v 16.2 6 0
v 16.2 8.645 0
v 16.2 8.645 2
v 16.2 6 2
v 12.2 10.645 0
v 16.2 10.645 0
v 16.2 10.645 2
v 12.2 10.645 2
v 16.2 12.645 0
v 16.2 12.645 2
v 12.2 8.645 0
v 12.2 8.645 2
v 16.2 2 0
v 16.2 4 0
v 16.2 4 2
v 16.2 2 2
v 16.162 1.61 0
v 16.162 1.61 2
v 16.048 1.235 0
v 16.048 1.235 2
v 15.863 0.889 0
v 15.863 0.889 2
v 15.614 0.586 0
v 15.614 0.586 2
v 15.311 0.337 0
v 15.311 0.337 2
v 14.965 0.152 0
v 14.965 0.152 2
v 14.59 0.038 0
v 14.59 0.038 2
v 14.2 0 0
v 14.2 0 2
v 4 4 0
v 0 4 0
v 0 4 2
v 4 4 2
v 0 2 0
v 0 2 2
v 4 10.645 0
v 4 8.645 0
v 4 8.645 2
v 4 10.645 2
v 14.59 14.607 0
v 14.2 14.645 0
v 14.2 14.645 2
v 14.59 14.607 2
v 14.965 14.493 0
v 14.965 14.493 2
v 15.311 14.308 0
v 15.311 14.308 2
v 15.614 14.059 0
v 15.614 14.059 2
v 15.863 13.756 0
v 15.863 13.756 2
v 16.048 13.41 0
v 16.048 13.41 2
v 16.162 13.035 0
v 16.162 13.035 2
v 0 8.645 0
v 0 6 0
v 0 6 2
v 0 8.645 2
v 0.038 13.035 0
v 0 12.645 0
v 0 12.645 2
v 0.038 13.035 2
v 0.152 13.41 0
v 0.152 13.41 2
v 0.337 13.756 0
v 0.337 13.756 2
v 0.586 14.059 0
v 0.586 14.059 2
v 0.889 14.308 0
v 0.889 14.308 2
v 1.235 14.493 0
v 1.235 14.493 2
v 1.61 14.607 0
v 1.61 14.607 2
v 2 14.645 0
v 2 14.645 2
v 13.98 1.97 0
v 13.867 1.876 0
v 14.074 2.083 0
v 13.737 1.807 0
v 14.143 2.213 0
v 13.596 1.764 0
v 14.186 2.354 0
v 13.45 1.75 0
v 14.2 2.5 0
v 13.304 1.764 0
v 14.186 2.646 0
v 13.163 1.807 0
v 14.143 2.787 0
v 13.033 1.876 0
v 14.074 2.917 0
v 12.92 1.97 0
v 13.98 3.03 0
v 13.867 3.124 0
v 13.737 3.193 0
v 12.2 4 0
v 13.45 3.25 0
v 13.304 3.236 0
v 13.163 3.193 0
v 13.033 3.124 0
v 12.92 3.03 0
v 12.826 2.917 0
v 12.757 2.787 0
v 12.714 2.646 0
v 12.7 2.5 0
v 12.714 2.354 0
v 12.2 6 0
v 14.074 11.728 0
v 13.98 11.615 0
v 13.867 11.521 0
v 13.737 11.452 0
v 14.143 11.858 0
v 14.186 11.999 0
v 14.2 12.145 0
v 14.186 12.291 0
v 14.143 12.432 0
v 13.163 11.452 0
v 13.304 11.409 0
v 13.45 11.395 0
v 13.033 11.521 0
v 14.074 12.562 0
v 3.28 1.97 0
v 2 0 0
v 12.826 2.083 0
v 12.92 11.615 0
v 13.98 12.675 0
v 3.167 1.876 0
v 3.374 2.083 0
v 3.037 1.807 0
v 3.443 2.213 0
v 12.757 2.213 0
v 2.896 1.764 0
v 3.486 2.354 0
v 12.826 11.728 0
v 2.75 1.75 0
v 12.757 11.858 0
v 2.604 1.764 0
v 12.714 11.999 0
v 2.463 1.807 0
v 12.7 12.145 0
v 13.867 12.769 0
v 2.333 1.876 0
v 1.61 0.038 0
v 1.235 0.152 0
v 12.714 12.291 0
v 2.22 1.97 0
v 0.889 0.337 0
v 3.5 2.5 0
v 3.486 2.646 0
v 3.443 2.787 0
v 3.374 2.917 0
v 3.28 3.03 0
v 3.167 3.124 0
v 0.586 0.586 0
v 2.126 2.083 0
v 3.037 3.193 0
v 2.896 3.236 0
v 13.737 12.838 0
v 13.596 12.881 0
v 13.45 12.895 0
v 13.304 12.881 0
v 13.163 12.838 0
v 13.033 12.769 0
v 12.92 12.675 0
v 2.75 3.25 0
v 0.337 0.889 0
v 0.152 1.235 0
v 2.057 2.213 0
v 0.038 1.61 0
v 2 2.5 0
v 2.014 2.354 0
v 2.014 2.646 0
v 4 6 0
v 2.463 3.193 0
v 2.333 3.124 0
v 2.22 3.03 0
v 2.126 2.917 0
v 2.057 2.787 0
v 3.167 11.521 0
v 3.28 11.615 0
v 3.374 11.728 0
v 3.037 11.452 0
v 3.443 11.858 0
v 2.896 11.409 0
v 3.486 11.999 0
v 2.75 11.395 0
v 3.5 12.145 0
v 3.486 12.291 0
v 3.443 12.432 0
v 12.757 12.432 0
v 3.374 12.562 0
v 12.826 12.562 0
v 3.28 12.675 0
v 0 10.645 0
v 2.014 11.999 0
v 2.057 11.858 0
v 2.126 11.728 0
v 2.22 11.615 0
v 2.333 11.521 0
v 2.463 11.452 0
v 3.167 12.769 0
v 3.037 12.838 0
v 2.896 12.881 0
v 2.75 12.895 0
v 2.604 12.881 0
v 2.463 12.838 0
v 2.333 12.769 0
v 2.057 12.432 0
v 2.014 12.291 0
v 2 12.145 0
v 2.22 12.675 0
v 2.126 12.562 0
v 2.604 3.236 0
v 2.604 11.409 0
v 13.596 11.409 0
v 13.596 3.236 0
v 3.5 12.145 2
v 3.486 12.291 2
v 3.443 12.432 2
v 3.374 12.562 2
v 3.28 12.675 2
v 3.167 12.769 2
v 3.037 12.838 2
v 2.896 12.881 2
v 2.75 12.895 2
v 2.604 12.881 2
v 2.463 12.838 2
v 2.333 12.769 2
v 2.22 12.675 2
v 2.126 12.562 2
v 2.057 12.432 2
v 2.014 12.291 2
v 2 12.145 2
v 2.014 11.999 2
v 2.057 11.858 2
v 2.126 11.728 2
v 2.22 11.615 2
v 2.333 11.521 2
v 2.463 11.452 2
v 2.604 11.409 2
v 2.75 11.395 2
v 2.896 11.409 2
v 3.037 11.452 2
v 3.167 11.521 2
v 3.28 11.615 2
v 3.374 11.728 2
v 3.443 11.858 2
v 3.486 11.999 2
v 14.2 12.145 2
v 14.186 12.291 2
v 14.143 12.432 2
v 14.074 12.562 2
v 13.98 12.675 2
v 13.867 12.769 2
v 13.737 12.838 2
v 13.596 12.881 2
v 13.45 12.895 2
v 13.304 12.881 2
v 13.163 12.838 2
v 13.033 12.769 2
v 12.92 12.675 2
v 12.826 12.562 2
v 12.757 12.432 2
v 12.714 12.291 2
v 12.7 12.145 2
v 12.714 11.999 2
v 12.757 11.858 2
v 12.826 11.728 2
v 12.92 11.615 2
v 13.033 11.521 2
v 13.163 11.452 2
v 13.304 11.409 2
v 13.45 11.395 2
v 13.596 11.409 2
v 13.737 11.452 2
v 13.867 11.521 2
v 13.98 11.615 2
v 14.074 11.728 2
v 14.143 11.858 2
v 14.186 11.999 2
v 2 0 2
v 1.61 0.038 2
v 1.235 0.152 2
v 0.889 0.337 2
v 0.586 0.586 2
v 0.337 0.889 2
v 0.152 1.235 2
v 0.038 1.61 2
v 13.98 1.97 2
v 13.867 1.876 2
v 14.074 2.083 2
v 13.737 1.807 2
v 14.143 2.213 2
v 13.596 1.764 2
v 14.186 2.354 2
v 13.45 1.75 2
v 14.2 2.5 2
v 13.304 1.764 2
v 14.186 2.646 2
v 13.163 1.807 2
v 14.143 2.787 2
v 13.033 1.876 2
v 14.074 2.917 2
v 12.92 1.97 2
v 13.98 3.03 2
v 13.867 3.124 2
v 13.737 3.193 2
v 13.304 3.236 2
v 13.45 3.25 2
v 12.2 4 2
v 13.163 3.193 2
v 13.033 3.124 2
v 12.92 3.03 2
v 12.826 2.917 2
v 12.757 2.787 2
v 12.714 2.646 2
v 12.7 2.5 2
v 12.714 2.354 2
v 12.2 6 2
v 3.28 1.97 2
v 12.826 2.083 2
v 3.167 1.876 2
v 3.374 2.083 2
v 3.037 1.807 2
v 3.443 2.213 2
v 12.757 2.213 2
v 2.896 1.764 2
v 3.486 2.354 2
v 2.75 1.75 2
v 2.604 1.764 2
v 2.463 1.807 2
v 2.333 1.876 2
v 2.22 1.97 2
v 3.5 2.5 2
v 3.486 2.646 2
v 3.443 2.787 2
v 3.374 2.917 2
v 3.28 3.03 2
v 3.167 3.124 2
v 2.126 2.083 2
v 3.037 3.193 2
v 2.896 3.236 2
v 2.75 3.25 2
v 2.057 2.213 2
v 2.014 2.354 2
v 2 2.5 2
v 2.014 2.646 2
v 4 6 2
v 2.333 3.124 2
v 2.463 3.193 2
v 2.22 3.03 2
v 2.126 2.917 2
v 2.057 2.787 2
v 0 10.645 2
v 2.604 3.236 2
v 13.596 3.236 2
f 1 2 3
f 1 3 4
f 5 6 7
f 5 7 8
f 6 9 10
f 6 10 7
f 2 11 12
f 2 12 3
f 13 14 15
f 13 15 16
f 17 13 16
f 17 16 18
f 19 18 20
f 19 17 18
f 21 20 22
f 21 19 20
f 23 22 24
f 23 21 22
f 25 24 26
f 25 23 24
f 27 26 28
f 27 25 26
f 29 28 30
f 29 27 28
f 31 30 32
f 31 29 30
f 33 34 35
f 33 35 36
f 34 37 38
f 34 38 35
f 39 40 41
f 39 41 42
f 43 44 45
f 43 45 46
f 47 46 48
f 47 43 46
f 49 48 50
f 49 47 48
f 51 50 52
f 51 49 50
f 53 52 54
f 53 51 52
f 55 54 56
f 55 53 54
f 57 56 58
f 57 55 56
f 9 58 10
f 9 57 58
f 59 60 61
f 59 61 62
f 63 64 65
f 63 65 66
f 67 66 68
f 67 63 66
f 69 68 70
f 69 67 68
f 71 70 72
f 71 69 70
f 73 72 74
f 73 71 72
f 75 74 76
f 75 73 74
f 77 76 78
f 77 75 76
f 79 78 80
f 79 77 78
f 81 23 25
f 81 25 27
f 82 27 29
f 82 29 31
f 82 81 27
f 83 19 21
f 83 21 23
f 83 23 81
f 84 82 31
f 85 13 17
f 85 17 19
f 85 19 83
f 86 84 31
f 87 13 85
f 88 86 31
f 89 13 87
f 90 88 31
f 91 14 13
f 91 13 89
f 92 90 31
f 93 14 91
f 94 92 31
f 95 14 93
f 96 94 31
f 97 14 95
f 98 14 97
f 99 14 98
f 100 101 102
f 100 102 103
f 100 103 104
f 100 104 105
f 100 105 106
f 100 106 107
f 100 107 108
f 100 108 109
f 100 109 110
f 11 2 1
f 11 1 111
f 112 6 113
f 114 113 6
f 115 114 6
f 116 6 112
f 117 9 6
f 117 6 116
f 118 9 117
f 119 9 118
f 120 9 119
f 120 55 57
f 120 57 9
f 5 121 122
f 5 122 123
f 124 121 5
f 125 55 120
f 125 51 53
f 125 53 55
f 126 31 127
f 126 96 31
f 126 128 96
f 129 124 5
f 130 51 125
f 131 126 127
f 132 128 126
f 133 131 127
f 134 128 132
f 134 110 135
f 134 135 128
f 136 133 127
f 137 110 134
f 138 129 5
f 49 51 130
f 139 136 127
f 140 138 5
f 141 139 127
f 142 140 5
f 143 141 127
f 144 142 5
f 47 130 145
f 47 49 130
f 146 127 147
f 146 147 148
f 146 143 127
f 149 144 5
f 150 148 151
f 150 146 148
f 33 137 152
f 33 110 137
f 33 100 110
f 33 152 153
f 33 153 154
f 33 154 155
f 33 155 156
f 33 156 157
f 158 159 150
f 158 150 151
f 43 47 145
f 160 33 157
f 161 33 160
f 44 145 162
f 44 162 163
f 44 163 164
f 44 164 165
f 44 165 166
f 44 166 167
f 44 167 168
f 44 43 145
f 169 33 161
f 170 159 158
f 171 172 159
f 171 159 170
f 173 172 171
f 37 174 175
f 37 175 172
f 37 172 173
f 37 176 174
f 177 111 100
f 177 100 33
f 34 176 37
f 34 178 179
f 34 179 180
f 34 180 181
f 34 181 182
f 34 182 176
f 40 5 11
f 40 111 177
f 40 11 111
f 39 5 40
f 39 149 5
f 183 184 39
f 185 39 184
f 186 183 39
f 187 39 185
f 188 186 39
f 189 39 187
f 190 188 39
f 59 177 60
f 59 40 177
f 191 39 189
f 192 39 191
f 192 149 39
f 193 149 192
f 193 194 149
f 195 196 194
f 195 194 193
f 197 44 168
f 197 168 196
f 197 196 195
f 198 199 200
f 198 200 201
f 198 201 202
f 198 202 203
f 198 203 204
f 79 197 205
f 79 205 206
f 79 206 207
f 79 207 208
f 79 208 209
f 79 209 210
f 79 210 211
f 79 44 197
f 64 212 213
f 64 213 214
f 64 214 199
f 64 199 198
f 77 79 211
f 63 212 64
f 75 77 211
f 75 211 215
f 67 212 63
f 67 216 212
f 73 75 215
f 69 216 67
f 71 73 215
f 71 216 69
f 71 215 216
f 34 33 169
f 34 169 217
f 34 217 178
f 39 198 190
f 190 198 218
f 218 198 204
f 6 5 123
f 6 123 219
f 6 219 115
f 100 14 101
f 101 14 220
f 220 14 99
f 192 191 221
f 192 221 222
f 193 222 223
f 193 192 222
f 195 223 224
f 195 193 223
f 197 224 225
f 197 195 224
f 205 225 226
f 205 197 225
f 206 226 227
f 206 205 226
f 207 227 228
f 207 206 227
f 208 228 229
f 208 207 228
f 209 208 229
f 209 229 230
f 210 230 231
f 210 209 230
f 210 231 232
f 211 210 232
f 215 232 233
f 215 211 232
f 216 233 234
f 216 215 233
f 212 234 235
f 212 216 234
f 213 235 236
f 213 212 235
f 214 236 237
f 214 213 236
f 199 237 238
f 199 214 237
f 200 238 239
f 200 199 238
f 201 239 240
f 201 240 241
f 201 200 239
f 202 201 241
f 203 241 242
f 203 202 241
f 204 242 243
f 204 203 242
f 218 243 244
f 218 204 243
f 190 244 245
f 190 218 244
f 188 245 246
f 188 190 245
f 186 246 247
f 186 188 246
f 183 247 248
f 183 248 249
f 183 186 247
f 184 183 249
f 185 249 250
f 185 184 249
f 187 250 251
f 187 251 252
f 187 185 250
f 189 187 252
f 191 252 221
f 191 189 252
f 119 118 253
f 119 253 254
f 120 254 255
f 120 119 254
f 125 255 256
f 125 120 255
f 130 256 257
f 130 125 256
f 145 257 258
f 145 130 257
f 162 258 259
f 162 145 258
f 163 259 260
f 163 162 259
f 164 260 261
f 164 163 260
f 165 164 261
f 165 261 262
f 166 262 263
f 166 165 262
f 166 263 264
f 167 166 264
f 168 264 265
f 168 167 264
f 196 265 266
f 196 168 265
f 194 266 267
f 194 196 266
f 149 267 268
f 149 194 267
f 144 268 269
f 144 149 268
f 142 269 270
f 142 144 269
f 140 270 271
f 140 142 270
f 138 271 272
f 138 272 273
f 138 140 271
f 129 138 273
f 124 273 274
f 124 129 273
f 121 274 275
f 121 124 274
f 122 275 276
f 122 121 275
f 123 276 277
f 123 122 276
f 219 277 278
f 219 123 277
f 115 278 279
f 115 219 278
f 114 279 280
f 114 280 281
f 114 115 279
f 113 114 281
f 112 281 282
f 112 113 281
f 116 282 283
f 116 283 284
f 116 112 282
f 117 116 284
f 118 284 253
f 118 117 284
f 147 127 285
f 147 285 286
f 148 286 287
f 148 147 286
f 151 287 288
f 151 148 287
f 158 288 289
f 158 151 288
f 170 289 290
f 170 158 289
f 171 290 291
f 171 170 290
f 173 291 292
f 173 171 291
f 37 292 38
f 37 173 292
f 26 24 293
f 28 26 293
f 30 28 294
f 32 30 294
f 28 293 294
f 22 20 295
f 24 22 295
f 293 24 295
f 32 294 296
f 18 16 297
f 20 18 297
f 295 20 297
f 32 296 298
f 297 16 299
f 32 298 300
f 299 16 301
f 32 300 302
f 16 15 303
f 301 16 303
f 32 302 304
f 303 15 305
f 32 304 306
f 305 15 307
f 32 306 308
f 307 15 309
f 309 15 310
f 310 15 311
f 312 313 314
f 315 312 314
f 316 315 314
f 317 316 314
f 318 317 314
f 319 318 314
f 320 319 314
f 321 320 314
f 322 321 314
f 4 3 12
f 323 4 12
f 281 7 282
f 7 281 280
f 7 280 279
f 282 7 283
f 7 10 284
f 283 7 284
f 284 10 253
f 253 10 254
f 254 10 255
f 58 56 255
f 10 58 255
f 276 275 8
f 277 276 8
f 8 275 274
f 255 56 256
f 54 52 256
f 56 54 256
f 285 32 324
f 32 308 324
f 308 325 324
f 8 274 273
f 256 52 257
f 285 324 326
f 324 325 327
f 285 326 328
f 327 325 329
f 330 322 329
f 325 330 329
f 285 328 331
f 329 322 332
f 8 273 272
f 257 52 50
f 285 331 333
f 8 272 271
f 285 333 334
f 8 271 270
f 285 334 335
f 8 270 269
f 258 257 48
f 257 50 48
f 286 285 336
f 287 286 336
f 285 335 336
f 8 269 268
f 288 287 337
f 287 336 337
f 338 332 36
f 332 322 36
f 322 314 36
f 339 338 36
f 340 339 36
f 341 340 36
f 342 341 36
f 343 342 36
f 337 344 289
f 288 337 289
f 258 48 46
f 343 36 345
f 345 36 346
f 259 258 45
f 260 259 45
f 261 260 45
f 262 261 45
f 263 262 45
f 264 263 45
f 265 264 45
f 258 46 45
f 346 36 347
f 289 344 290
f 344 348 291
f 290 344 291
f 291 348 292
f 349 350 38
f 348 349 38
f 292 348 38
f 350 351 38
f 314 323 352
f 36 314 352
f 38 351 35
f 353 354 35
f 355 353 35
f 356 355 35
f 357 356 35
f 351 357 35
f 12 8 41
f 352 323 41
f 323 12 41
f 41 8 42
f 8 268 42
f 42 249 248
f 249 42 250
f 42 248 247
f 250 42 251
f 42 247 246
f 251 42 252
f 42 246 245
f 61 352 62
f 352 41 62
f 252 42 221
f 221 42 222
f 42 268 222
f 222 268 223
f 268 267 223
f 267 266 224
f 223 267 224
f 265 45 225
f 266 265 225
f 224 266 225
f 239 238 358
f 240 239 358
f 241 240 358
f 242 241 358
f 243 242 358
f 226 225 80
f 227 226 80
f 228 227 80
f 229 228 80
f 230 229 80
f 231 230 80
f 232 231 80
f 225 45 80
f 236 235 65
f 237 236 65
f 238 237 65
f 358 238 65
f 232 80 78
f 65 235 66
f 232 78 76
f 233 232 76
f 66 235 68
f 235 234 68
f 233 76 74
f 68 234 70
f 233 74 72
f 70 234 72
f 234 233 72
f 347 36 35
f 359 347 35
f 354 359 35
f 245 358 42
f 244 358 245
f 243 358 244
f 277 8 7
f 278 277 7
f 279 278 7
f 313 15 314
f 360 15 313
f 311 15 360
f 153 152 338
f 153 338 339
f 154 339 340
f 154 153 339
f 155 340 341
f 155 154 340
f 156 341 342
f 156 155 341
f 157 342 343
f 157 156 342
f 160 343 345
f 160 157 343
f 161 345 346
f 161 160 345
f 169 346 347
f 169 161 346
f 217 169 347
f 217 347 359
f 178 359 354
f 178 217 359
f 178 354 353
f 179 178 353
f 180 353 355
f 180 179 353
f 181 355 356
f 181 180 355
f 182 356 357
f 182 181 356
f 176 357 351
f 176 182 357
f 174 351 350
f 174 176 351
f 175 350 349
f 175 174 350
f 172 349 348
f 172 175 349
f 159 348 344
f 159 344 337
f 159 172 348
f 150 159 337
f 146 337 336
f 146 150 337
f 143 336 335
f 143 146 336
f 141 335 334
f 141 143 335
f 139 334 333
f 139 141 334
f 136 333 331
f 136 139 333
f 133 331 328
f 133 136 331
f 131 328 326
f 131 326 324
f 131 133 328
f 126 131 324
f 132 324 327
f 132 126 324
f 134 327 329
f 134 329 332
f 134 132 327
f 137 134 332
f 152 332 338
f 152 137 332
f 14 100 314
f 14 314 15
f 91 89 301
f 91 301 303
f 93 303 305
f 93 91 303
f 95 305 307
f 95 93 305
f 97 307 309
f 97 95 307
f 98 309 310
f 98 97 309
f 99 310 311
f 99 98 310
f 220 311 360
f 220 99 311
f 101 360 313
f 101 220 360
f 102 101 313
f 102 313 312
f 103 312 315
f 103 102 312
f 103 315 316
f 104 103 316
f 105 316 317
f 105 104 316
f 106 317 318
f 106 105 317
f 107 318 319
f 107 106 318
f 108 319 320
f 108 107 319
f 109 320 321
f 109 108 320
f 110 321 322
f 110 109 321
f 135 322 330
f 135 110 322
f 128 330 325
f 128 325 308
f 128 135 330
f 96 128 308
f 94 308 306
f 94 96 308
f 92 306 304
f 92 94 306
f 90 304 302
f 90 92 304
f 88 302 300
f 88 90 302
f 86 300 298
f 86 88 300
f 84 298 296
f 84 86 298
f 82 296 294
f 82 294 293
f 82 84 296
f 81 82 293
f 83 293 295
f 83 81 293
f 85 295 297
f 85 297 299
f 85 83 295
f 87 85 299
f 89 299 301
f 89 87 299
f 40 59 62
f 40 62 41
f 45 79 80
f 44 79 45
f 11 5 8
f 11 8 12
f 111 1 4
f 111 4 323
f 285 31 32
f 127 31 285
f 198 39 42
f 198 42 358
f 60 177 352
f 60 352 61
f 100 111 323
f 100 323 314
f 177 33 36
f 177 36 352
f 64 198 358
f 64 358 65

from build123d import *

# Parameters (mm, degrees)
SKETCH1_R           = 0.75
BOSS_EXTRUDE1_DEPTH = 2


with BuildPart() as part:
    # Sketch1 → Boss-Extrude1 (new body)
    with BuildSketch(Plane.XY):
        with BuildLine():
            Line((16.2, 4), (16.2, 2))
            ThreePointArc((16.2, 2), (15.614213562, 0.585786438), (14.2, 0))
            Line((14.2, 0), (2, 0))
            ThreePointArc((2, 0), (0.585786438, 0.585786438), (0, 2))
            Line((0, 2), (0, 4))
            Line((0, 4), (4, 4))
            Line((4, 4), (4, 6))
            Line((4, 6), (0, 6))
            Line((0, 6), (0, 8.645))
            Line((0, 8.645), (4, 8.645))
            Line((4, 8.645), (4, 10.645))
            Line((4, 10.645), (0, 10.645))
            Line((0, 10.645), (0, 12.645))
            ThreePointArc((0, 12.645), (0.585786438, 14.059213562), (2, 14.645))
            Line((2, 14.645), (14.2, 14.645))
            ThreePointArc((14.2, 14.645), (15.614213562, 14.059213562), (16.2, 12.645))
            Line((16.2, 12.645), (16.2, 10.645))
            Line((16.2, 10.645), (12.2, 10.645))
            Line((12.2, 10.645), (12.2, 8.645))
            Line((12.2, 8.645), (16.2, 8.645))
            Line((16.2, 8.645), (16.2, 6))
            Line((16.2, 6), (12.2, 6))
            Line((12.2, 6), (12.2, 4))
            Line((12.2, 4), (16.2, 4))
        make_face()
        with Locations((13.45, 2.5)):
            Circle(SKETCH1_R, mode=Mode.SUBTRACT)
        with Locations((2.75, 12.145)):
            Circle(SKETCH1_R, mode=Mode.SUBTRACT)
        with Locations((13.45, 12.145)):
            Circle(SKETCH1_R, mode=Mode.SUBTRACT)
        with Locations((2.75, 2.5)):
            Circle(SKETCH1_R, mode=Mode.SUBTRACT)
    extrude(amount=BOSS_EXTRUDE1_DEPTH)


solid = part.part
